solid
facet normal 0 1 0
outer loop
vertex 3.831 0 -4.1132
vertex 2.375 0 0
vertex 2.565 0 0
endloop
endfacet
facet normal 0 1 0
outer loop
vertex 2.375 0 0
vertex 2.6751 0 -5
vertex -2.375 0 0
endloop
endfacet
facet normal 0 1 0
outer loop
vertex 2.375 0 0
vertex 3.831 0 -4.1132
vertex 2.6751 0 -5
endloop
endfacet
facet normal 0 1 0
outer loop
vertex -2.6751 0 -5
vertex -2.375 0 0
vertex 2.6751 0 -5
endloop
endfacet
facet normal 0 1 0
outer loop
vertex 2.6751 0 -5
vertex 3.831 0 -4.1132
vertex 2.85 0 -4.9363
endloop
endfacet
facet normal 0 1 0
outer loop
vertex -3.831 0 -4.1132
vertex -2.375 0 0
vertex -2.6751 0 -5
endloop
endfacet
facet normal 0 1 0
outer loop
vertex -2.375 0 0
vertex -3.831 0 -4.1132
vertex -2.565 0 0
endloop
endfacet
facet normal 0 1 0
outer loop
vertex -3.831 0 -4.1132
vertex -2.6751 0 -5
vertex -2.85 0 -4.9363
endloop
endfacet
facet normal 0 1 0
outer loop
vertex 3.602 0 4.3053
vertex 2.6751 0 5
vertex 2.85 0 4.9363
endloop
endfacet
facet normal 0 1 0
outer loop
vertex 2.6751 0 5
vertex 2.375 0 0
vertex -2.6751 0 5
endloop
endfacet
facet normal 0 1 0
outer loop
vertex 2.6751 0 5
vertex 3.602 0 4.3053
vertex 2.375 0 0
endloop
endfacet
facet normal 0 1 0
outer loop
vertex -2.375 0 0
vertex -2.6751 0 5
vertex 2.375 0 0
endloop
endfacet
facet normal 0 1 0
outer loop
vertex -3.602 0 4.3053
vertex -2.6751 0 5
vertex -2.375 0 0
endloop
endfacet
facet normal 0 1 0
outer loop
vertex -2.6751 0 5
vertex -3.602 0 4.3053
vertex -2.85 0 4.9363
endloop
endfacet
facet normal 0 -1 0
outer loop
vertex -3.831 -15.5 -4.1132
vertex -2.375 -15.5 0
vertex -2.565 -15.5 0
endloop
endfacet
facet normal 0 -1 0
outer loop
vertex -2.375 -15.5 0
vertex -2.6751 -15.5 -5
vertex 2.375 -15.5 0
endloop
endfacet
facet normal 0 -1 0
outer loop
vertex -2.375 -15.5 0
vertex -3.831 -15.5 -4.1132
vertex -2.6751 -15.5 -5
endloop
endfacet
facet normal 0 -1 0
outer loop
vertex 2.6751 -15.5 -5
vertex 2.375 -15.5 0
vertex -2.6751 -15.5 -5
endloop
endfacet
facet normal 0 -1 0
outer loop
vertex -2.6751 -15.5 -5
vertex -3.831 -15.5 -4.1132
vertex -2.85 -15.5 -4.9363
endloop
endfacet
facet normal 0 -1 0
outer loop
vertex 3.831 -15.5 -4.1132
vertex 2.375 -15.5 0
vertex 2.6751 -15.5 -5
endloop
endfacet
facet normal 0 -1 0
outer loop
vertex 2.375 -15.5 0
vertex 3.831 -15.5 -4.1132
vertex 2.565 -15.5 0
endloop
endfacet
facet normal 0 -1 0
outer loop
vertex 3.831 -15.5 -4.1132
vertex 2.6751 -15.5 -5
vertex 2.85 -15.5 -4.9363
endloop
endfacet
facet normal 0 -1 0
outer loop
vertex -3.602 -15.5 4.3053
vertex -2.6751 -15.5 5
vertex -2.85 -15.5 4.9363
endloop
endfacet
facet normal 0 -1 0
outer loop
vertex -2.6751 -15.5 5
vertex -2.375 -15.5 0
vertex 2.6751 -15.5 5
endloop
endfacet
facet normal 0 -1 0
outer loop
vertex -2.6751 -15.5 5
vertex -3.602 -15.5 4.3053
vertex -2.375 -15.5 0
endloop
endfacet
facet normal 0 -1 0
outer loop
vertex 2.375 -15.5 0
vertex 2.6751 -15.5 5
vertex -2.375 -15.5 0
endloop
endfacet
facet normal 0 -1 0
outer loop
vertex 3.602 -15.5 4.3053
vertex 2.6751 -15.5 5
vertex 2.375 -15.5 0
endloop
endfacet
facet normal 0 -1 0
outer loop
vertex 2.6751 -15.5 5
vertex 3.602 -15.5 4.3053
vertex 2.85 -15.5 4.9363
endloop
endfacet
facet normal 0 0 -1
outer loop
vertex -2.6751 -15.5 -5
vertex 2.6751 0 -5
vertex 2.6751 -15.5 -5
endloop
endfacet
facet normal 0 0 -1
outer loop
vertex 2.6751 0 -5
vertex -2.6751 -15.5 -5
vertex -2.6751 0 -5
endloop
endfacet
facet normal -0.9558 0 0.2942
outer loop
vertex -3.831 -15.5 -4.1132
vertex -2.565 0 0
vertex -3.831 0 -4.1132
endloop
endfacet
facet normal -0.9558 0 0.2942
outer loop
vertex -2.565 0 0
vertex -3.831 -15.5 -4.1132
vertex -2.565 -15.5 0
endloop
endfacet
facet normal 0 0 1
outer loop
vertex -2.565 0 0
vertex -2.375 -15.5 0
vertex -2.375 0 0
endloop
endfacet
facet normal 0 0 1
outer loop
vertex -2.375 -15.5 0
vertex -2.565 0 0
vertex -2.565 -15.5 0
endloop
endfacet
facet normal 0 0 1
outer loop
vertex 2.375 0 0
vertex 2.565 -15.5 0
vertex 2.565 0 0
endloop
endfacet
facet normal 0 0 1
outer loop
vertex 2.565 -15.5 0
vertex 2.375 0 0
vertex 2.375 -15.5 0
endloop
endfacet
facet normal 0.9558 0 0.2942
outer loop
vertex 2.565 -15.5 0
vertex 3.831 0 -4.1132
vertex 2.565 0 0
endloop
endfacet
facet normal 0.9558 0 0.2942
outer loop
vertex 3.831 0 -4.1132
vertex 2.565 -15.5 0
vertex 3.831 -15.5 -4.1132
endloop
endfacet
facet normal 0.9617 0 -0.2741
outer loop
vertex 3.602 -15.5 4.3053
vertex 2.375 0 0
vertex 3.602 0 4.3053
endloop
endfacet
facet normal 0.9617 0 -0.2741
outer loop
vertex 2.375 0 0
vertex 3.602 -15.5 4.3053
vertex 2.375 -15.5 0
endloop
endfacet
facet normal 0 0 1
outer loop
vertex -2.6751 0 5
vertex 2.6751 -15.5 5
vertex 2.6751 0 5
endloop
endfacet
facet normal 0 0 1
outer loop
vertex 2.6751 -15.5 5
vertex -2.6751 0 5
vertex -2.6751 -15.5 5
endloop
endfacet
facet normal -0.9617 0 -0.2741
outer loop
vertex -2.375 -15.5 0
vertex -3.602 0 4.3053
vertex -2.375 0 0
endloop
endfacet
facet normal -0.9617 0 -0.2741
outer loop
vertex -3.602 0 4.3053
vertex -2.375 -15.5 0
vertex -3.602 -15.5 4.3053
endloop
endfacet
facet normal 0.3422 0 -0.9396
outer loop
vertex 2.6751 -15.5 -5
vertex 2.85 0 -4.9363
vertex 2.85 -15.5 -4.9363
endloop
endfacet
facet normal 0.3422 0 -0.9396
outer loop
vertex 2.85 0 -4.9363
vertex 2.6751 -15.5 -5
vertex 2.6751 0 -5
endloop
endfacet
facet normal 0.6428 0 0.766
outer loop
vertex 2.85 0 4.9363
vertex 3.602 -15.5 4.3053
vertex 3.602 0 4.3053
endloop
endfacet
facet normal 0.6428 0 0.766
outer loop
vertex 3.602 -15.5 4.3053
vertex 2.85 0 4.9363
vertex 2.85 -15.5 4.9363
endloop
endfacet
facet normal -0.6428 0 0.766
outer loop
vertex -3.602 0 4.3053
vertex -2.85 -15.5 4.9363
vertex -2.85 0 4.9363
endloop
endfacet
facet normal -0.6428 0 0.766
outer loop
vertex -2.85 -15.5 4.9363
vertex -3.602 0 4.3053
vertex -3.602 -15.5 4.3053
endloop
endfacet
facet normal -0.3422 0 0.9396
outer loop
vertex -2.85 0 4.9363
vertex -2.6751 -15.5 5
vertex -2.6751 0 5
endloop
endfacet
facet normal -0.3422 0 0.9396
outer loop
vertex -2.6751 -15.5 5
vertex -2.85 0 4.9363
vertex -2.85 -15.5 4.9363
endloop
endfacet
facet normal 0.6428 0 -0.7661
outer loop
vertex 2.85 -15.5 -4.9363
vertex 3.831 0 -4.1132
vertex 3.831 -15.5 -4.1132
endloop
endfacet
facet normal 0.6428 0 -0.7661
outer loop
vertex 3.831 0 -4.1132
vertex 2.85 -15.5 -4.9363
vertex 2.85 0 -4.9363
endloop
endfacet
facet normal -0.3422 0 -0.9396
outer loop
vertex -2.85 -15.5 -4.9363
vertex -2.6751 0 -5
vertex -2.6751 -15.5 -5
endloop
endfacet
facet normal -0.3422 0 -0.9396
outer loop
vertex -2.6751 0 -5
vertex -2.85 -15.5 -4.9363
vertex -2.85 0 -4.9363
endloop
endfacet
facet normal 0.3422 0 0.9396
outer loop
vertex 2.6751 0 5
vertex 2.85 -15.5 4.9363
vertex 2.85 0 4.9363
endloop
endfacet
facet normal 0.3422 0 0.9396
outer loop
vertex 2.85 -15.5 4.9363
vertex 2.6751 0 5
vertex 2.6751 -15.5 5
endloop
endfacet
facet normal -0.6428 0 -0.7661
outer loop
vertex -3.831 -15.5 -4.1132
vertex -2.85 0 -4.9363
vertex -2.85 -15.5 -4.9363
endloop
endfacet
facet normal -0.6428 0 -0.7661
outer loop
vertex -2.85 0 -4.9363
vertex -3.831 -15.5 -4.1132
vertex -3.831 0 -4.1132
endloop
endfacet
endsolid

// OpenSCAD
// file: ../../globals.scad
/*
Most things in this file is represented as one millimeter, so keep that in mind while changing things.
Some of the setting are not mm but at variables that you can set, such as 2*x=2x and you are setting what x is.
I will try to specify when things are variables and not exact measurements.
*/

//Virindi settings
dovetail_male_width_scale = 0.98;
dovetail_male_height_scale = 0.91;

obj_leg = 30;
leg_length = 5.5;
small_number = 0.001;
metal_core_rode_global = 5;


///////////////// number of holes /////////////////////
z_hole_number = 8;
other_holes = 8;

///////////////// Pins /////////////////////

//pins that poke out
ball_size = 10;
pin_height = 20;
pin_diameter = 6;


//holes
hole_ball_size = ball_size;
hole_pin_height = pin_height;
hole_pin_diameter = pin_diameter;

///////////////// Z THINGS /////////////////////

berring_slot_width = 7.5;
berring_slot_depth = 6.5;
metal_core_rode = 5;

///////////////// X THINGS /////////////////////

//male dove tails
max_width=8;
min_width=5;
depth=5;
height=obj_leg/2;

//female dove tails, this is found on the y mounts
girl_max_width=11;
girl_min_width=5;
girl_depth=5;
girl_height=obj_leg;


///////////////// Y THINGS /////////////////////
/*
The Y is so normal that all of those global variables at the top should change all of the setting in it, this section is set her incase there are variables set in the future development of this project.
*/
// file: ../../include.scad
//////////////////      END SECTION       //////////////////

	module added_pins(){
		difference(){
			union(){
				translate([30/(15/4),obj_leg*leg_length,30/(15/4)]) pin();
				translate([30/(15/4)+14.5,obj_leg*leg_length,30/(15/4)+14]) pin();
			}
			union(){
							translate([30/(15/4)+13.5,obj_leg*leg_length-20,30/(15/4)+5])cube(size=[2,40,15]);
							translate([30/(15/4)+7.5,obj_leg*leg_length-20,30/(15/4)+15])rotate([0,90,0]) cube(size=[2,40,15]);	

							translate([30/(15/4)-1,obj_leg*leg_length-20,30/(15/4)-8])cube(size=[2,40,15]);
							translate([30/(15/4)-10,obj_leg*leg_length-20,30/(15/4)+1])rotate([0,90,0]) cube(size=[2,40,15]);
			}
		}
	}
	module taken_pins() {
		translate([30/(15/4)+14,obj_leg*leg_length-10,30/(15/4)]) mirror_pin();
		translate([30/(15/4),obj_leg*leg_length-10,30/(15/4)+15]) mirror_pin();
	}


//////////////////      OTHER STUFF       //////////////////

	module holes() {
		rotate([0,0,90]) for(y=[0:other_holes])
		translate([obj_leg+y*15,-15.5,7.5]) union() {
			translate([7.5,0,15]) hole_up();
			hole_down();
		}
	}
	module extend_holes() {
	module top(){
		rotate([0,0,90]) for(y=[0:other_holes+1])
		translate([(30/4)+y*15,-15.5,7.5]) union() {
			translate([7.5,0,15]) hole_up();
		}
	}
	module bottom(){
		rotate([0,0,90]) for(y=[0:other_holes+2])
		translate([(30/4)+y*15,-15.5,7.5]) union() {
			hole_down();
		
}
	}
	union(){
		top();
		bottom();
	}
	}

	module hole() {
		union() {
			rotate([90, 90, 0]) cylinder(h=40, d=hole_pin_diameter, center=true);
			translate([0,7.5,0]) sphere(d=hole_ball_size);
			translate([0,-6,0]) sphere(d=hole_ball_size);
		}
	}
	module hole_up() {
		union() {
			rotate([90, 90, 0]) cylinder(h=40, d=hole_pin_diameter, center=true);
			translate([0,7.5,10]) cylinder(h=hole_pin_height, d=hole_pin_diameter, center=true);
			translate([0,-6,10]) cylinder(h=hole_pin_height, d=hole_pin_diameter, center=true);
			translate([0,7.5,0]) sphere(d=hole_ball_size);
			translate([0,-6,0]) sphere(d=hole_ball_size);
		}
	}
	module hole_down() {
		union() {
			rotate([90, 90, 0]) cylinder(h=40, d=hole_pin_diameter, center=true);
			translate([0,7.5,-10]) cylinder(h=hole_pin_height, d=hole_pin_diameter, center=true);
			translate([0,-6,-10]) cylinder(h=hole_pin_height, d=hole_pin_diameter, center=true);
			translate([0,7.5,0]) sphere(d=hole_ball_size);
			translate([0,-6,0]) sphere(d=hole_ball_size);
		}
	}
	module pin() {
		union() {
			rotate([90, 90, 0]) cylinder(h=pin_height, d=pin_diameter, center=true);
			translate([0,7.5,0]) sphere(d=ball_size);
		}
	}

	module mirror_pin() {
		rotate([90, 90, 0]) cylinder(h=hole_pin_height+small_number, d=hole_pin_diameter, center=true);
		translate([0,-(pin_height-(ball_size/2)),0]) sphere(d=ball_size);
	}


//////////////////      SOME RACK AND Z THINGS       //////////////////

module z_holes() {
    rotate([0,-90,0]) for(z=[0:z_hole_number])
    translate([22.5+z*15,16,-12])
        hole();
}

module pin_cuts() {
	union(){
		cube(size=[2,10,40], center=true);
		rotate([0,0,90]) cube(size=[2,10,40], center=true);
	}
}
module pin_uncut() {
	union(){
		rotate([0, 0, 90]) cylinder(h=hole_pin_height, d=hole_pin_diameter, center=true);
		translate([0,0,10]) sphere(d=ball_hole);
	}
}


module pin_out() {
	union(){
		rotate([0, 0, 90]) cylinder(h=pin_height, d=pin_diameter, center=true);
		translate([0,0,10]) sphere(d= ball_size);
	}
}


module pins_z(){
	difference() {
		pin_out();
		pin_cuts();
	}
}
//////////////////      RACK AND SLIDE     ///////////////////

module straight_pins() {
	for(z=[0:((((obj_leg*leg_length)*2)-(obj_leg*2))/3)/14.5]) rotate([-90,0,0]) translate([z*15,30/(15/4),14]) pins_z();
	for(z=[0:((((obj_leg*leg_length)*2)-(obj_leg*2))/3)/14.5]) rotate([-90,0,0]) translate([z*15,30/(15/4)-14,14]) pins_z();
}
module stagger_pins() {
	for(z=[0:((((obj_leg*leg_length)*2)-(obj_leg*2))/3)/14.5]) rotate([-90,0,0]) translate([z*15,30/(15/4),14]) pins_z();
	for(z=[0:((((obj_leg*leg_length)*2)-(obj_leg*2))/3)/14.5]) rotate([-90,0,0]) translate([z*15+7,30/(15/4)-14,14]) pins_z();
}


//////////////////      DOVE TAIL       //////////////////

module male_dovetail(height) {
	dovetail_3d(max_width,min_width,depth,height);
}

module dovetail_3d(max_width=11, min_width=5, depth=5, height=30) {
	linear_extrude(height=height, convexity=2)
		dovetail_2d(max_width,min_width,depth);
}

module dovetail_2d(max_width=11, min_width=5, depth=5) {
	angle=atan((max_width/2-min_width/2)/depth);
	echo("angle: ", angle);
	polygon(paths=[[0,1,2,3,0]], points=[[-min_width/2,0], [-max_width/2,depth], [max_width/2, depth], [min_width/2,0]]);
}

//bow tie
	module tie_end(height){
				rotate([0,0,0]) translate([0,-0.01,((obj_leg/2)/2)]) male_dovetail(height);
				rotate([0,90,0]) translate([0,-0.01,((obj_leg/2)/2)]) male_dovetail(height);
				rotate([0,180,0]) translate([0,-0.01,((obj_leg/2)/2)]) male_dovetail(height);
				rotate([0,-90,0]) translate([0,-0.01,((obj_leg/2)/2)]) male_dovetail(height);
	}

module bow_support(){
	difference(){
		intersection(){
			translate([-15,0,-15]) cube([30,9,30]);
			scale([1.05,1.05,1.05]) rotate([0,45,0]) tie_end();
		}
		cube([29.2,29.2,29.2], center=true);
	}
}

	module wrap(units){
	for (y = [-1:units-2]) // two iterations, z = -1, z = 1
	{
			translate([15, (y*30)+15, 15]){
			for (r = [0:4]) // two iterations, z = -1, z = 1
			{
				rotate([0,r*90,0]) translate([0,15,15]) rotate([-90,0,0])male_dovetail(height=30);
			}
		}
	}
	}
// main file
length = 15.5;
tilt_level = 1.1;
scaling_x = .95;
scaling_y = 1;
scaling_z = 1;
include <../../include.scad>;
include <../../globals.scad>;

obj_leg= 12;
module bow_tie_master(){
	union(){
		mirror([0,1,0]){
			scale([1.08,1,1]) male_dovetail(height=length);
		}
			male_dovetail(height=length);		
	}
}

intersection(){
    scale([scaling_x,scaling_y,scaling_z])	rotate([90,0,0]) bow_tie_master();
    rotate([90,0,0]) cylinder(r=5.7, h=200);
}
